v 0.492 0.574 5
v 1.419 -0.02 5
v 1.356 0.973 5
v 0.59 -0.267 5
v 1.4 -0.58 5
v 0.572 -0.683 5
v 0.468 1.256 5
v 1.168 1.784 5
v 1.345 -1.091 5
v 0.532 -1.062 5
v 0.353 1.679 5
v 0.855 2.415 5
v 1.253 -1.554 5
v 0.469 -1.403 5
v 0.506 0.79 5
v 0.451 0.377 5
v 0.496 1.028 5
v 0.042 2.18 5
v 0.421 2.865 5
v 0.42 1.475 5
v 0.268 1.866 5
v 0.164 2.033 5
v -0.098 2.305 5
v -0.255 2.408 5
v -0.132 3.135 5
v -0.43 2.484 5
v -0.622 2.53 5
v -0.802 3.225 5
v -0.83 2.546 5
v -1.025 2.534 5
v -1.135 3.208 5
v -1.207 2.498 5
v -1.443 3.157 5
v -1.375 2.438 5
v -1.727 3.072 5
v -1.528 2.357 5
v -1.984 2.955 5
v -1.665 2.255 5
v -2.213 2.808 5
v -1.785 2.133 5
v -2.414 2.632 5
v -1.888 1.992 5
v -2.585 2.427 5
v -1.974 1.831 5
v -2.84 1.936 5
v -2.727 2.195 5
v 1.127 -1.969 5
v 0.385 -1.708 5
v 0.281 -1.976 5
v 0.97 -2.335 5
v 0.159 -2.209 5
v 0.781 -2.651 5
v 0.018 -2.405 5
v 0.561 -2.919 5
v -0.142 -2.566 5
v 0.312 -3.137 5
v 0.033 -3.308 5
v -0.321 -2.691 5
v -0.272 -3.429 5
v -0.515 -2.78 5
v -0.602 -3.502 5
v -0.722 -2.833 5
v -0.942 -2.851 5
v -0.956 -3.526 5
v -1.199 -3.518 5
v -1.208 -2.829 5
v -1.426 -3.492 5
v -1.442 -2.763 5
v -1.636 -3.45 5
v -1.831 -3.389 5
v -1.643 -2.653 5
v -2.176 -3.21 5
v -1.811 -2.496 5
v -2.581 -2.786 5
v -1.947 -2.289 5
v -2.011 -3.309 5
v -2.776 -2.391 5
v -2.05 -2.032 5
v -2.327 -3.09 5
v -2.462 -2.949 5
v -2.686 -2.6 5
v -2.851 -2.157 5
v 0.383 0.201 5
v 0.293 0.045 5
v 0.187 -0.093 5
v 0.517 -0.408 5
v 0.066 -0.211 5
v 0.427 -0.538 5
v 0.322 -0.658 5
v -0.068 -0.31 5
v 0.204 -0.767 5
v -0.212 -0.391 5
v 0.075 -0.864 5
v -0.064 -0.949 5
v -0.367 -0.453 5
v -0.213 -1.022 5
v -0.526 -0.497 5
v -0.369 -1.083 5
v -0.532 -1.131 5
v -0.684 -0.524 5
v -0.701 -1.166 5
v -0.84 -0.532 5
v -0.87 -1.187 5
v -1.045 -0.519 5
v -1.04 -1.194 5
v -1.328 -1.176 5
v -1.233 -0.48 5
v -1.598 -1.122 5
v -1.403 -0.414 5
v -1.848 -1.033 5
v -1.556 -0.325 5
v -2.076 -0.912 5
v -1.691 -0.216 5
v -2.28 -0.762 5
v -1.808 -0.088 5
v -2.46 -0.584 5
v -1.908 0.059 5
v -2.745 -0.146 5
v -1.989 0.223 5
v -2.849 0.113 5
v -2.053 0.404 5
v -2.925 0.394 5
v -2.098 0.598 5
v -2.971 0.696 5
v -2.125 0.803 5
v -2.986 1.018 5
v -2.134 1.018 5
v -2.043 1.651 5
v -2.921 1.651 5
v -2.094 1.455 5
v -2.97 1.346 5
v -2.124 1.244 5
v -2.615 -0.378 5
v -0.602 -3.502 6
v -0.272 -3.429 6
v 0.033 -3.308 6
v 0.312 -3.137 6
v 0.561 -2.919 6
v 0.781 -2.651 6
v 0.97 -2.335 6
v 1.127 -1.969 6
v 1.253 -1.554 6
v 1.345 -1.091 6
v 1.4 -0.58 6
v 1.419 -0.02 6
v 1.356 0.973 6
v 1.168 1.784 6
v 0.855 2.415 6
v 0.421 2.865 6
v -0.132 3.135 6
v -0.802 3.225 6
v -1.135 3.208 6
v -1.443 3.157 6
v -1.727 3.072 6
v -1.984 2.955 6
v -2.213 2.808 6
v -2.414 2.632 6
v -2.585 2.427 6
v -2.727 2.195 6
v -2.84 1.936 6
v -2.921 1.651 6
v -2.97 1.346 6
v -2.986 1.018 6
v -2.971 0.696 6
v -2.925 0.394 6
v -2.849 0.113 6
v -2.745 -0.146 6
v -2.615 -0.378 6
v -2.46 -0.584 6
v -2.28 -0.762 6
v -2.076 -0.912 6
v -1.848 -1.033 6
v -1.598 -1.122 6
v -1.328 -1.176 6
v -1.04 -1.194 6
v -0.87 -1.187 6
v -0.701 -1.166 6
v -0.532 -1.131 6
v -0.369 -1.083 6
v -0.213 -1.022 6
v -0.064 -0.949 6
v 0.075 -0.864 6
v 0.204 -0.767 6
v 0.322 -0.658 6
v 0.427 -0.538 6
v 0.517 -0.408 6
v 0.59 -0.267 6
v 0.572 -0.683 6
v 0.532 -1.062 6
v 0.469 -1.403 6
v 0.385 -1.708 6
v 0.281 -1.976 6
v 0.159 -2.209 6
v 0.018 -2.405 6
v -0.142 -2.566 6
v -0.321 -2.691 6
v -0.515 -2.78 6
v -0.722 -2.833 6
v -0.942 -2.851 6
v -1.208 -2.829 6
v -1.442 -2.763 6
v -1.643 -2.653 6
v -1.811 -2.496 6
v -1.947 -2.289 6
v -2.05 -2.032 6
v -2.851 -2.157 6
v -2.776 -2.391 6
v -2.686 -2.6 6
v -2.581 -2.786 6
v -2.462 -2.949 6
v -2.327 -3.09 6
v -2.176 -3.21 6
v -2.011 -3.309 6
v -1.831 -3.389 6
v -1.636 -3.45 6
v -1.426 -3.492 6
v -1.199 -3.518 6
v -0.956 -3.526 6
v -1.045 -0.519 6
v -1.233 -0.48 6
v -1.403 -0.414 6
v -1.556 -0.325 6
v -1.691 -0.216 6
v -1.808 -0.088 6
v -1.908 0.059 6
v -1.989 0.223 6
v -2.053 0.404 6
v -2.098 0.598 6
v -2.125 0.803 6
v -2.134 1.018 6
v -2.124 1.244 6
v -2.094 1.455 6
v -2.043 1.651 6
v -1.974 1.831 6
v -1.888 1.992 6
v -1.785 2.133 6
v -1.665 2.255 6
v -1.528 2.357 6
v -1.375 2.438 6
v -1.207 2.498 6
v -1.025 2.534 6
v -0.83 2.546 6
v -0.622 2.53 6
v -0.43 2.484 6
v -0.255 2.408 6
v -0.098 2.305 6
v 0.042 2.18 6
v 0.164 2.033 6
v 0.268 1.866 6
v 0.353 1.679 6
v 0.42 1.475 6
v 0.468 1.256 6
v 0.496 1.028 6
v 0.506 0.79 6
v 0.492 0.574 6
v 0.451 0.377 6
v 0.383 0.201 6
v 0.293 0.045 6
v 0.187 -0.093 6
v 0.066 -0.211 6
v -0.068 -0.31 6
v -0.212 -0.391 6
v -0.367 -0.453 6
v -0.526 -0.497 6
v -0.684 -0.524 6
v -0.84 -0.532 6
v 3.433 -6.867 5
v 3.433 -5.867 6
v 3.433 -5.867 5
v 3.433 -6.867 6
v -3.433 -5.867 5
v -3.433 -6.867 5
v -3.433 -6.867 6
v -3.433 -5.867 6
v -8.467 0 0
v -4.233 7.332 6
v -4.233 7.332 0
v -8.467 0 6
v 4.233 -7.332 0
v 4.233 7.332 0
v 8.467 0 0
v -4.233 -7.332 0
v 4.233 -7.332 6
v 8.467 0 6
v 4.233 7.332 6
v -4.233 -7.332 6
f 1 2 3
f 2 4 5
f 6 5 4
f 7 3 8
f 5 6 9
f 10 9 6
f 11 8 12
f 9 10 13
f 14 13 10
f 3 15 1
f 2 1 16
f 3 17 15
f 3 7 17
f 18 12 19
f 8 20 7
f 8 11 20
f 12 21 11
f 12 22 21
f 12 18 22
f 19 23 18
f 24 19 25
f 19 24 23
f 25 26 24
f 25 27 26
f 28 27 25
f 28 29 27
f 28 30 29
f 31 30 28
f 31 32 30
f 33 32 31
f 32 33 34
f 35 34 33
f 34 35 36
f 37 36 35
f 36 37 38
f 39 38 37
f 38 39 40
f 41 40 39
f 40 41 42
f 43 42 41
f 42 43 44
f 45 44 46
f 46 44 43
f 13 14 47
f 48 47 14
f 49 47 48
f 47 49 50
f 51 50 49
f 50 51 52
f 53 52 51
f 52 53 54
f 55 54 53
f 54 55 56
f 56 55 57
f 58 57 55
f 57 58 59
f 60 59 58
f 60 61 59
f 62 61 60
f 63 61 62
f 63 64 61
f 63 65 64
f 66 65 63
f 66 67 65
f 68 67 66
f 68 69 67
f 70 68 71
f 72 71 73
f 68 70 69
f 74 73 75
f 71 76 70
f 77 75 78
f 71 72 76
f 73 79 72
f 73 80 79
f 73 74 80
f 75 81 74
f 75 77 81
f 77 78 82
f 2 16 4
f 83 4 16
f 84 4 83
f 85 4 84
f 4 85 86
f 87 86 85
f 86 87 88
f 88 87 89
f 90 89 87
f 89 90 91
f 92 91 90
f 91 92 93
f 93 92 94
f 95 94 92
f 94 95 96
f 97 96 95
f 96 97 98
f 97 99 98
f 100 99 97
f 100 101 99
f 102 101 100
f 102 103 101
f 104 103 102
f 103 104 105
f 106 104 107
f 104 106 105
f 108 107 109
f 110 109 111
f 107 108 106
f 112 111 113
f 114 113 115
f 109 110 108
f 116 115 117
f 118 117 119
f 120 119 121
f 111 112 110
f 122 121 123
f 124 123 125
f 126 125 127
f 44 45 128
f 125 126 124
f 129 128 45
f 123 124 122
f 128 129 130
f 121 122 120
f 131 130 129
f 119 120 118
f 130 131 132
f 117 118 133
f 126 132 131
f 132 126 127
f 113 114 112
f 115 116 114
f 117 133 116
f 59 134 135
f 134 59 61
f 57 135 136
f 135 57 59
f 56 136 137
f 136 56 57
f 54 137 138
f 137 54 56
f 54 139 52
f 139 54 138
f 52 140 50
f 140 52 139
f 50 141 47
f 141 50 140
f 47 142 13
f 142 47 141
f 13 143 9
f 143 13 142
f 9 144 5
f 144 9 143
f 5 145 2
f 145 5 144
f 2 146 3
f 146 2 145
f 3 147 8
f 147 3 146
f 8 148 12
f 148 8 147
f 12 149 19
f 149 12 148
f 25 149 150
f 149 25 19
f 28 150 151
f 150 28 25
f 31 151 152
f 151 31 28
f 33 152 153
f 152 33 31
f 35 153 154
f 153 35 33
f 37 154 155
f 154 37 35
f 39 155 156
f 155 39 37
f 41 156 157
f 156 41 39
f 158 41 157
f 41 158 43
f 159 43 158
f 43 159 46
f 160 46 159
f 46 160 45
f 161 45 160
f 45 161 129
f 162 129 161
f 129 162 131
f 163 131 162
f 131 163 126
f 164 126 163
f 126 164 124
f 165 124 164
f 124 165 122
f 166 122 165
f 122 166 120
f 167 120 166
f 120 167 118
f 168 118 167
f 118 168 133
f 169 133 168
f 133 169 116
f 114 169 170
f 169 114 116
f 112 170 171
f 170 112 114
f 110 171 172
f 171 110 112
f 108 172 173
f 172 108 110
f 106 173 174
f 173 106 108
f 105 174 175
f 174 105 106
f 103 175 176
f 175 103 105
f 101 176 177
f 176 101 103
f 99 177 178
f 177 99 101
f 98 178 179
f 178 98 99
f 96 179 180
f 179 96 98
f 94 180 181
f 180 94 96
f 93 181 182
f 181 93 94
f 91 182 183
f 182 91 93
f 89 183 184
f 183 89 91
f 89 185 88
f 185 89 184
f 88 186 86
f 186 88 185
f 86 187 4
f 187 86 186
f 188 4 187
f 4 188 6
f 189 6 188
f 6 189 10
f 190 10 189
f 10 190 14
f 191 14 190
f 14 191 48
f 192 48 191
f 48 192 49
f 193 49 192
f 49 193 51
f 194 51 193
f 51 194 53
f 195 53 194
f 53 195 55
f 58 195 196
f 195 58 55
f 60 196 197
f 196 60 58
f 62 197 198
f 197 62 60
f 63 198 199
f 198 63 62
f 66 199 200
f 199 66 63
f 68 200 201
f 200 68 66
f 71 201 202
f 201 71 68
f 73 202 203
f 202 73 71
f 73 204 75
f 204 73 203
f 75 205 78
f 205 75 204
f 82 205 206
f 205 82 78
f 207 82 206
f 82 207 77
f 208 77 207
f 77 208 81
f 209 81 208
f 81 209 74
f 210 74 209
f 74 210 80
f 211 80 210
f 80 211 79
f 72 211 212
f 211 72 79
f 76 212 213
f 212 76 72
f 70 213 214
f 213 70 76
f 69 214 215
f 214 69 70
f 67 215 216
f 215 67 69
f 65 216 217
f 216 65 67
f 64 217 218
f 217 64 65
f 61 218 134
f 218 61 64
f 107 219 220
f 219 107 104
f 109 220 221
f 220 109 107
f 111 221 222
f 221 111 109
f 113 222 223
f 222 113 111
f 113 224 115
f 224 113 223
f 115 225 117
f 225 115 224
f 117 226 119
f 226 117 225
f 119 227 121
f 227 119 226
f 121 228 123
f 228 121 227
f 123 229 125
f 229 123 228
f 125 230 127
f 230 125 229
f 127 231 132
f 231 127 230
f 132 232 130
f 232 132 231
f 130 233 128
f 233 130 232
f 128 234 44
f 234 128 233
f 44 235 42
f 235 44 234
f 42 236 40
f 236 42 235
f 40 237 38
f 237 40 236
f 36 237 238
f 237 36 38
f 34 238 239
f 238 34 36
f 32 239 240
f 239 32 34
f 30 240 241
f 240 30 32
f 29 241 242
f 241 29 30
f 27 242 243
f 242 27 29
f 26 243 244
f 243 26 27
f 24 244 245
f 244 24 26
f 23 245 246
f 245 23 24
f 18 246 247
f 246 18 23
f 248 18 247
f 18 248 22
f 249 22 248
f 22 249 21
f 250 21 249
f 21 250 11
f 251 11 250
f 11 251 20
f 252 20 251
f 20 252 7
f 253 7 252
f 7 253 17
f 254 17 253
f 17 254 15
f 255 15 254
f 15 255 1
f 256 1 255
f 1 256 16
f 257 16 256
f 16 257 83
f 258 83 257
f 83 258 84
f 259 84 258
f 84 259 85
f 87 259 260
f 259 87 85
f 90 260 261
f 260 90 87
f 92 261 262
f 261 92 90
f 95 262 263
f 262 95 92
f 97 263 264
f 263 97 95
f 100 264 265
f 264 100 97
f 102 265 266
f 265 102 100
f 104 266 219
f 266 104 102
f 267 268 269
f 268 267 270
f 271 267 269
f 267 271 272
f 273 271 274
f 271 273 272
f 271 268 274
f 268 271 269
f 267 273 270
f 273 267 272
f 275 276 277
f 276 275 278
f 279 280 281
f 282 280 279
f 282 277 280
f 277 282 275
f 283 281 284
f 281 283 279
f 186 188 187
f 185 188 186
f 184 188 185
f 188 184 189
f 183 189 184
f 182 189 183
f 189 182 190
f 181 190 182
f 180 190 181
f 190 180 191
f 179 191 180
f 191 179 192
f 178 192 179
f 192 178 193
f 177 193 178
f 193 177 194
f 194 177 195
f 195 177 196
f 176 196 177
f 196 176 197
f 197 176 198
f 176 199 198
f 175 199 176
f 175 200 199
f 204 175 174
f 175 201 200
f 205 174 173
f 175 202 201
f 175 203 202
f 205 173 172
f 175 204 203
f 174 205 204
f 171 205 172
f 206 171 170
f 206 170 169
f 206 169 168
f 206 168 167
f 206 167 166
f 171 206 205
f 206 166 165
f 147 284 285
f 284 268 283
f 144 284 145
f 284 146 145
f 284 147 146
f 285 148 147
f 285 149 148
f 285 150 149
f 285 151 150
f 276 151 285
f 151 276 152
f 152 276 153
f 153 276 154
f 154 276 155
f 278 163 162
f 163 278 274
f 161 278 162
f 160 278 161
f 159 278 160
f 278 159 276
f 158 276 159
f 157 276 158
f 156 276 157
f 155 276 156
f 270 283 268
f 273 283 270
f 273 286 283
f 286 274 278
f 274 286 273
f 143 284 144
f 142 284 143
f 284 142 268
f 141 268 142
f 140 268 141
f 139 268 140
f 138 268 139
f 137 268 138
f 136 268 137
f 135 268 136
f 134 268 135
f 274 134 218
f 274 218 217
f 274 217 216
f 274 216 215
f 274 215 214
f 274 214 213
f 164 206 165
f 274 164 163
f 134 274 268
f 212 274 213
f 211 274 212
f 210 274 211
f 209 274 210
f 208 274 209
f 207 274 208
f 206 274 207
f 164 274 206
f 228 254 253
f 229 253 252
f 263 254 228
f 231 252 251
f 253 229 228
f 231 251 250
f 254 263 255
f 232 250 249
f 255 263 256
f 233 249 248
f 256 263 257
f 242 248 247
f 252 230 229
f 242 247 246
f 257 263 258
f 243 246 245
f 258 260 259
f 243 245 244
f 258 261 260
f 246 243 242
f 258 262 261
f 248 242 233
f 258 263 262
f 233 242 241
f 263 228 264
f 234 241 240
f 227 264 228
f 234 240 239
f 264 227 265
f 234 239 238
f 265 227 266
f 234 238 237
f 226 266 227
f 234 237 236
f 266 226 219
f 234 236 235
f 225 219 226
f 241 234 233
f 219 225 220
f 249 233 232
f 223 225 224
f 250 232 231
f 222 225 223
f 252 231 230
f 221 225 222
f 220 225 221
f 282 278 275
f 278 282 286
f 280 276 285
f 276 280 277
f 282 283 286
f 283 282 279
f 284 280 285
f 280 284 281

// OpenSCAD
// file: ../library/calculate.scad
module inlay(depth)
{
    difference()
    {
        children(0);
        translate([ 0, 0, depth ]) children([1:$children - 1]);
    }
}
// file: ../library/variables.scad
// Variables

die_width = 12;
double_digit_placement = 1; // 0.7 for 8mm, 1 for 12mm

wiggle_width = 0.2;
separator = 1.6;
base_plate_sides = 5;
token_sides = 6;
slot_height = 1;

// Calculations

height = die_width / 2;

die_slot_width = die_width + wiggle_width;
die_slot_y = -1 * ((die_slot_width / 2) + separator);
die_slot_right_x = (die_slot_width / 2) + separator;
die_slot_left_x = -1 * (die_slot_width / 2) - separator;

base_plate_size = (die_slot_width * 2) + separator;
inset_width = base_plate_size - separator;
inset_depth = height - separator;

shallow_slot_height = (height - inset_depth) / 2;

token_slot_width = base_plate_size / 3;
token_width = token_slot_width - wiggle_width;
token_height = height;
token_slot_y = (die_slot_width / 2) + (separator * 2);
token_inset_height = token_height - 1;
token_doubledigit_font_size = token_width - separator;

token_poison_width = (token_width / 3);
token_poison_placement = (token_width / 3);
// file: ../library/tokens.scad
include <variables.scad>
include <calculate.scad>

module token_base()
{
    linear_extrude(token_height) circle(token_width, $fn = token_sides);
}

module token_doubledigit_number(num) 
{
    inlay(depth = token_inset_height) 
    {
        token_base();
        translate([-1 * token_doubledigit_font_size + double_digit_placement, -1 * token_doubledigit_font_size / 2, 0]) linear_extrude(token_height) text(text = num, size = token_doubledigit_font_size);
        translate([-1 * token_doubledigit_font_size / 2, -1 * token_doubledigit_font_size, 0]) cube([token_doubledigit_font_size, 1, 2]);
    }
}

module token_singledigit_number(num) 
{ 
    inlay(depth = token_inset_height) 
    {
        token_base();
        translate([-1 * (token_doubledigit_font_size / 2), -1 * token_doubledigit_font_size / 2, 0]) linear_extrude(token_height) text(text = num, size = token_doubledigit_font_size);
        translate([-1 * token_doubledigit_font_size / 2, -1 * token_doubledigit_font_size, 0]) cube([token_doubledigit_font_size, 1, 2]);
    }
}
// main file
include <../library/tokens.scad>

token_singledigit_number("9");
